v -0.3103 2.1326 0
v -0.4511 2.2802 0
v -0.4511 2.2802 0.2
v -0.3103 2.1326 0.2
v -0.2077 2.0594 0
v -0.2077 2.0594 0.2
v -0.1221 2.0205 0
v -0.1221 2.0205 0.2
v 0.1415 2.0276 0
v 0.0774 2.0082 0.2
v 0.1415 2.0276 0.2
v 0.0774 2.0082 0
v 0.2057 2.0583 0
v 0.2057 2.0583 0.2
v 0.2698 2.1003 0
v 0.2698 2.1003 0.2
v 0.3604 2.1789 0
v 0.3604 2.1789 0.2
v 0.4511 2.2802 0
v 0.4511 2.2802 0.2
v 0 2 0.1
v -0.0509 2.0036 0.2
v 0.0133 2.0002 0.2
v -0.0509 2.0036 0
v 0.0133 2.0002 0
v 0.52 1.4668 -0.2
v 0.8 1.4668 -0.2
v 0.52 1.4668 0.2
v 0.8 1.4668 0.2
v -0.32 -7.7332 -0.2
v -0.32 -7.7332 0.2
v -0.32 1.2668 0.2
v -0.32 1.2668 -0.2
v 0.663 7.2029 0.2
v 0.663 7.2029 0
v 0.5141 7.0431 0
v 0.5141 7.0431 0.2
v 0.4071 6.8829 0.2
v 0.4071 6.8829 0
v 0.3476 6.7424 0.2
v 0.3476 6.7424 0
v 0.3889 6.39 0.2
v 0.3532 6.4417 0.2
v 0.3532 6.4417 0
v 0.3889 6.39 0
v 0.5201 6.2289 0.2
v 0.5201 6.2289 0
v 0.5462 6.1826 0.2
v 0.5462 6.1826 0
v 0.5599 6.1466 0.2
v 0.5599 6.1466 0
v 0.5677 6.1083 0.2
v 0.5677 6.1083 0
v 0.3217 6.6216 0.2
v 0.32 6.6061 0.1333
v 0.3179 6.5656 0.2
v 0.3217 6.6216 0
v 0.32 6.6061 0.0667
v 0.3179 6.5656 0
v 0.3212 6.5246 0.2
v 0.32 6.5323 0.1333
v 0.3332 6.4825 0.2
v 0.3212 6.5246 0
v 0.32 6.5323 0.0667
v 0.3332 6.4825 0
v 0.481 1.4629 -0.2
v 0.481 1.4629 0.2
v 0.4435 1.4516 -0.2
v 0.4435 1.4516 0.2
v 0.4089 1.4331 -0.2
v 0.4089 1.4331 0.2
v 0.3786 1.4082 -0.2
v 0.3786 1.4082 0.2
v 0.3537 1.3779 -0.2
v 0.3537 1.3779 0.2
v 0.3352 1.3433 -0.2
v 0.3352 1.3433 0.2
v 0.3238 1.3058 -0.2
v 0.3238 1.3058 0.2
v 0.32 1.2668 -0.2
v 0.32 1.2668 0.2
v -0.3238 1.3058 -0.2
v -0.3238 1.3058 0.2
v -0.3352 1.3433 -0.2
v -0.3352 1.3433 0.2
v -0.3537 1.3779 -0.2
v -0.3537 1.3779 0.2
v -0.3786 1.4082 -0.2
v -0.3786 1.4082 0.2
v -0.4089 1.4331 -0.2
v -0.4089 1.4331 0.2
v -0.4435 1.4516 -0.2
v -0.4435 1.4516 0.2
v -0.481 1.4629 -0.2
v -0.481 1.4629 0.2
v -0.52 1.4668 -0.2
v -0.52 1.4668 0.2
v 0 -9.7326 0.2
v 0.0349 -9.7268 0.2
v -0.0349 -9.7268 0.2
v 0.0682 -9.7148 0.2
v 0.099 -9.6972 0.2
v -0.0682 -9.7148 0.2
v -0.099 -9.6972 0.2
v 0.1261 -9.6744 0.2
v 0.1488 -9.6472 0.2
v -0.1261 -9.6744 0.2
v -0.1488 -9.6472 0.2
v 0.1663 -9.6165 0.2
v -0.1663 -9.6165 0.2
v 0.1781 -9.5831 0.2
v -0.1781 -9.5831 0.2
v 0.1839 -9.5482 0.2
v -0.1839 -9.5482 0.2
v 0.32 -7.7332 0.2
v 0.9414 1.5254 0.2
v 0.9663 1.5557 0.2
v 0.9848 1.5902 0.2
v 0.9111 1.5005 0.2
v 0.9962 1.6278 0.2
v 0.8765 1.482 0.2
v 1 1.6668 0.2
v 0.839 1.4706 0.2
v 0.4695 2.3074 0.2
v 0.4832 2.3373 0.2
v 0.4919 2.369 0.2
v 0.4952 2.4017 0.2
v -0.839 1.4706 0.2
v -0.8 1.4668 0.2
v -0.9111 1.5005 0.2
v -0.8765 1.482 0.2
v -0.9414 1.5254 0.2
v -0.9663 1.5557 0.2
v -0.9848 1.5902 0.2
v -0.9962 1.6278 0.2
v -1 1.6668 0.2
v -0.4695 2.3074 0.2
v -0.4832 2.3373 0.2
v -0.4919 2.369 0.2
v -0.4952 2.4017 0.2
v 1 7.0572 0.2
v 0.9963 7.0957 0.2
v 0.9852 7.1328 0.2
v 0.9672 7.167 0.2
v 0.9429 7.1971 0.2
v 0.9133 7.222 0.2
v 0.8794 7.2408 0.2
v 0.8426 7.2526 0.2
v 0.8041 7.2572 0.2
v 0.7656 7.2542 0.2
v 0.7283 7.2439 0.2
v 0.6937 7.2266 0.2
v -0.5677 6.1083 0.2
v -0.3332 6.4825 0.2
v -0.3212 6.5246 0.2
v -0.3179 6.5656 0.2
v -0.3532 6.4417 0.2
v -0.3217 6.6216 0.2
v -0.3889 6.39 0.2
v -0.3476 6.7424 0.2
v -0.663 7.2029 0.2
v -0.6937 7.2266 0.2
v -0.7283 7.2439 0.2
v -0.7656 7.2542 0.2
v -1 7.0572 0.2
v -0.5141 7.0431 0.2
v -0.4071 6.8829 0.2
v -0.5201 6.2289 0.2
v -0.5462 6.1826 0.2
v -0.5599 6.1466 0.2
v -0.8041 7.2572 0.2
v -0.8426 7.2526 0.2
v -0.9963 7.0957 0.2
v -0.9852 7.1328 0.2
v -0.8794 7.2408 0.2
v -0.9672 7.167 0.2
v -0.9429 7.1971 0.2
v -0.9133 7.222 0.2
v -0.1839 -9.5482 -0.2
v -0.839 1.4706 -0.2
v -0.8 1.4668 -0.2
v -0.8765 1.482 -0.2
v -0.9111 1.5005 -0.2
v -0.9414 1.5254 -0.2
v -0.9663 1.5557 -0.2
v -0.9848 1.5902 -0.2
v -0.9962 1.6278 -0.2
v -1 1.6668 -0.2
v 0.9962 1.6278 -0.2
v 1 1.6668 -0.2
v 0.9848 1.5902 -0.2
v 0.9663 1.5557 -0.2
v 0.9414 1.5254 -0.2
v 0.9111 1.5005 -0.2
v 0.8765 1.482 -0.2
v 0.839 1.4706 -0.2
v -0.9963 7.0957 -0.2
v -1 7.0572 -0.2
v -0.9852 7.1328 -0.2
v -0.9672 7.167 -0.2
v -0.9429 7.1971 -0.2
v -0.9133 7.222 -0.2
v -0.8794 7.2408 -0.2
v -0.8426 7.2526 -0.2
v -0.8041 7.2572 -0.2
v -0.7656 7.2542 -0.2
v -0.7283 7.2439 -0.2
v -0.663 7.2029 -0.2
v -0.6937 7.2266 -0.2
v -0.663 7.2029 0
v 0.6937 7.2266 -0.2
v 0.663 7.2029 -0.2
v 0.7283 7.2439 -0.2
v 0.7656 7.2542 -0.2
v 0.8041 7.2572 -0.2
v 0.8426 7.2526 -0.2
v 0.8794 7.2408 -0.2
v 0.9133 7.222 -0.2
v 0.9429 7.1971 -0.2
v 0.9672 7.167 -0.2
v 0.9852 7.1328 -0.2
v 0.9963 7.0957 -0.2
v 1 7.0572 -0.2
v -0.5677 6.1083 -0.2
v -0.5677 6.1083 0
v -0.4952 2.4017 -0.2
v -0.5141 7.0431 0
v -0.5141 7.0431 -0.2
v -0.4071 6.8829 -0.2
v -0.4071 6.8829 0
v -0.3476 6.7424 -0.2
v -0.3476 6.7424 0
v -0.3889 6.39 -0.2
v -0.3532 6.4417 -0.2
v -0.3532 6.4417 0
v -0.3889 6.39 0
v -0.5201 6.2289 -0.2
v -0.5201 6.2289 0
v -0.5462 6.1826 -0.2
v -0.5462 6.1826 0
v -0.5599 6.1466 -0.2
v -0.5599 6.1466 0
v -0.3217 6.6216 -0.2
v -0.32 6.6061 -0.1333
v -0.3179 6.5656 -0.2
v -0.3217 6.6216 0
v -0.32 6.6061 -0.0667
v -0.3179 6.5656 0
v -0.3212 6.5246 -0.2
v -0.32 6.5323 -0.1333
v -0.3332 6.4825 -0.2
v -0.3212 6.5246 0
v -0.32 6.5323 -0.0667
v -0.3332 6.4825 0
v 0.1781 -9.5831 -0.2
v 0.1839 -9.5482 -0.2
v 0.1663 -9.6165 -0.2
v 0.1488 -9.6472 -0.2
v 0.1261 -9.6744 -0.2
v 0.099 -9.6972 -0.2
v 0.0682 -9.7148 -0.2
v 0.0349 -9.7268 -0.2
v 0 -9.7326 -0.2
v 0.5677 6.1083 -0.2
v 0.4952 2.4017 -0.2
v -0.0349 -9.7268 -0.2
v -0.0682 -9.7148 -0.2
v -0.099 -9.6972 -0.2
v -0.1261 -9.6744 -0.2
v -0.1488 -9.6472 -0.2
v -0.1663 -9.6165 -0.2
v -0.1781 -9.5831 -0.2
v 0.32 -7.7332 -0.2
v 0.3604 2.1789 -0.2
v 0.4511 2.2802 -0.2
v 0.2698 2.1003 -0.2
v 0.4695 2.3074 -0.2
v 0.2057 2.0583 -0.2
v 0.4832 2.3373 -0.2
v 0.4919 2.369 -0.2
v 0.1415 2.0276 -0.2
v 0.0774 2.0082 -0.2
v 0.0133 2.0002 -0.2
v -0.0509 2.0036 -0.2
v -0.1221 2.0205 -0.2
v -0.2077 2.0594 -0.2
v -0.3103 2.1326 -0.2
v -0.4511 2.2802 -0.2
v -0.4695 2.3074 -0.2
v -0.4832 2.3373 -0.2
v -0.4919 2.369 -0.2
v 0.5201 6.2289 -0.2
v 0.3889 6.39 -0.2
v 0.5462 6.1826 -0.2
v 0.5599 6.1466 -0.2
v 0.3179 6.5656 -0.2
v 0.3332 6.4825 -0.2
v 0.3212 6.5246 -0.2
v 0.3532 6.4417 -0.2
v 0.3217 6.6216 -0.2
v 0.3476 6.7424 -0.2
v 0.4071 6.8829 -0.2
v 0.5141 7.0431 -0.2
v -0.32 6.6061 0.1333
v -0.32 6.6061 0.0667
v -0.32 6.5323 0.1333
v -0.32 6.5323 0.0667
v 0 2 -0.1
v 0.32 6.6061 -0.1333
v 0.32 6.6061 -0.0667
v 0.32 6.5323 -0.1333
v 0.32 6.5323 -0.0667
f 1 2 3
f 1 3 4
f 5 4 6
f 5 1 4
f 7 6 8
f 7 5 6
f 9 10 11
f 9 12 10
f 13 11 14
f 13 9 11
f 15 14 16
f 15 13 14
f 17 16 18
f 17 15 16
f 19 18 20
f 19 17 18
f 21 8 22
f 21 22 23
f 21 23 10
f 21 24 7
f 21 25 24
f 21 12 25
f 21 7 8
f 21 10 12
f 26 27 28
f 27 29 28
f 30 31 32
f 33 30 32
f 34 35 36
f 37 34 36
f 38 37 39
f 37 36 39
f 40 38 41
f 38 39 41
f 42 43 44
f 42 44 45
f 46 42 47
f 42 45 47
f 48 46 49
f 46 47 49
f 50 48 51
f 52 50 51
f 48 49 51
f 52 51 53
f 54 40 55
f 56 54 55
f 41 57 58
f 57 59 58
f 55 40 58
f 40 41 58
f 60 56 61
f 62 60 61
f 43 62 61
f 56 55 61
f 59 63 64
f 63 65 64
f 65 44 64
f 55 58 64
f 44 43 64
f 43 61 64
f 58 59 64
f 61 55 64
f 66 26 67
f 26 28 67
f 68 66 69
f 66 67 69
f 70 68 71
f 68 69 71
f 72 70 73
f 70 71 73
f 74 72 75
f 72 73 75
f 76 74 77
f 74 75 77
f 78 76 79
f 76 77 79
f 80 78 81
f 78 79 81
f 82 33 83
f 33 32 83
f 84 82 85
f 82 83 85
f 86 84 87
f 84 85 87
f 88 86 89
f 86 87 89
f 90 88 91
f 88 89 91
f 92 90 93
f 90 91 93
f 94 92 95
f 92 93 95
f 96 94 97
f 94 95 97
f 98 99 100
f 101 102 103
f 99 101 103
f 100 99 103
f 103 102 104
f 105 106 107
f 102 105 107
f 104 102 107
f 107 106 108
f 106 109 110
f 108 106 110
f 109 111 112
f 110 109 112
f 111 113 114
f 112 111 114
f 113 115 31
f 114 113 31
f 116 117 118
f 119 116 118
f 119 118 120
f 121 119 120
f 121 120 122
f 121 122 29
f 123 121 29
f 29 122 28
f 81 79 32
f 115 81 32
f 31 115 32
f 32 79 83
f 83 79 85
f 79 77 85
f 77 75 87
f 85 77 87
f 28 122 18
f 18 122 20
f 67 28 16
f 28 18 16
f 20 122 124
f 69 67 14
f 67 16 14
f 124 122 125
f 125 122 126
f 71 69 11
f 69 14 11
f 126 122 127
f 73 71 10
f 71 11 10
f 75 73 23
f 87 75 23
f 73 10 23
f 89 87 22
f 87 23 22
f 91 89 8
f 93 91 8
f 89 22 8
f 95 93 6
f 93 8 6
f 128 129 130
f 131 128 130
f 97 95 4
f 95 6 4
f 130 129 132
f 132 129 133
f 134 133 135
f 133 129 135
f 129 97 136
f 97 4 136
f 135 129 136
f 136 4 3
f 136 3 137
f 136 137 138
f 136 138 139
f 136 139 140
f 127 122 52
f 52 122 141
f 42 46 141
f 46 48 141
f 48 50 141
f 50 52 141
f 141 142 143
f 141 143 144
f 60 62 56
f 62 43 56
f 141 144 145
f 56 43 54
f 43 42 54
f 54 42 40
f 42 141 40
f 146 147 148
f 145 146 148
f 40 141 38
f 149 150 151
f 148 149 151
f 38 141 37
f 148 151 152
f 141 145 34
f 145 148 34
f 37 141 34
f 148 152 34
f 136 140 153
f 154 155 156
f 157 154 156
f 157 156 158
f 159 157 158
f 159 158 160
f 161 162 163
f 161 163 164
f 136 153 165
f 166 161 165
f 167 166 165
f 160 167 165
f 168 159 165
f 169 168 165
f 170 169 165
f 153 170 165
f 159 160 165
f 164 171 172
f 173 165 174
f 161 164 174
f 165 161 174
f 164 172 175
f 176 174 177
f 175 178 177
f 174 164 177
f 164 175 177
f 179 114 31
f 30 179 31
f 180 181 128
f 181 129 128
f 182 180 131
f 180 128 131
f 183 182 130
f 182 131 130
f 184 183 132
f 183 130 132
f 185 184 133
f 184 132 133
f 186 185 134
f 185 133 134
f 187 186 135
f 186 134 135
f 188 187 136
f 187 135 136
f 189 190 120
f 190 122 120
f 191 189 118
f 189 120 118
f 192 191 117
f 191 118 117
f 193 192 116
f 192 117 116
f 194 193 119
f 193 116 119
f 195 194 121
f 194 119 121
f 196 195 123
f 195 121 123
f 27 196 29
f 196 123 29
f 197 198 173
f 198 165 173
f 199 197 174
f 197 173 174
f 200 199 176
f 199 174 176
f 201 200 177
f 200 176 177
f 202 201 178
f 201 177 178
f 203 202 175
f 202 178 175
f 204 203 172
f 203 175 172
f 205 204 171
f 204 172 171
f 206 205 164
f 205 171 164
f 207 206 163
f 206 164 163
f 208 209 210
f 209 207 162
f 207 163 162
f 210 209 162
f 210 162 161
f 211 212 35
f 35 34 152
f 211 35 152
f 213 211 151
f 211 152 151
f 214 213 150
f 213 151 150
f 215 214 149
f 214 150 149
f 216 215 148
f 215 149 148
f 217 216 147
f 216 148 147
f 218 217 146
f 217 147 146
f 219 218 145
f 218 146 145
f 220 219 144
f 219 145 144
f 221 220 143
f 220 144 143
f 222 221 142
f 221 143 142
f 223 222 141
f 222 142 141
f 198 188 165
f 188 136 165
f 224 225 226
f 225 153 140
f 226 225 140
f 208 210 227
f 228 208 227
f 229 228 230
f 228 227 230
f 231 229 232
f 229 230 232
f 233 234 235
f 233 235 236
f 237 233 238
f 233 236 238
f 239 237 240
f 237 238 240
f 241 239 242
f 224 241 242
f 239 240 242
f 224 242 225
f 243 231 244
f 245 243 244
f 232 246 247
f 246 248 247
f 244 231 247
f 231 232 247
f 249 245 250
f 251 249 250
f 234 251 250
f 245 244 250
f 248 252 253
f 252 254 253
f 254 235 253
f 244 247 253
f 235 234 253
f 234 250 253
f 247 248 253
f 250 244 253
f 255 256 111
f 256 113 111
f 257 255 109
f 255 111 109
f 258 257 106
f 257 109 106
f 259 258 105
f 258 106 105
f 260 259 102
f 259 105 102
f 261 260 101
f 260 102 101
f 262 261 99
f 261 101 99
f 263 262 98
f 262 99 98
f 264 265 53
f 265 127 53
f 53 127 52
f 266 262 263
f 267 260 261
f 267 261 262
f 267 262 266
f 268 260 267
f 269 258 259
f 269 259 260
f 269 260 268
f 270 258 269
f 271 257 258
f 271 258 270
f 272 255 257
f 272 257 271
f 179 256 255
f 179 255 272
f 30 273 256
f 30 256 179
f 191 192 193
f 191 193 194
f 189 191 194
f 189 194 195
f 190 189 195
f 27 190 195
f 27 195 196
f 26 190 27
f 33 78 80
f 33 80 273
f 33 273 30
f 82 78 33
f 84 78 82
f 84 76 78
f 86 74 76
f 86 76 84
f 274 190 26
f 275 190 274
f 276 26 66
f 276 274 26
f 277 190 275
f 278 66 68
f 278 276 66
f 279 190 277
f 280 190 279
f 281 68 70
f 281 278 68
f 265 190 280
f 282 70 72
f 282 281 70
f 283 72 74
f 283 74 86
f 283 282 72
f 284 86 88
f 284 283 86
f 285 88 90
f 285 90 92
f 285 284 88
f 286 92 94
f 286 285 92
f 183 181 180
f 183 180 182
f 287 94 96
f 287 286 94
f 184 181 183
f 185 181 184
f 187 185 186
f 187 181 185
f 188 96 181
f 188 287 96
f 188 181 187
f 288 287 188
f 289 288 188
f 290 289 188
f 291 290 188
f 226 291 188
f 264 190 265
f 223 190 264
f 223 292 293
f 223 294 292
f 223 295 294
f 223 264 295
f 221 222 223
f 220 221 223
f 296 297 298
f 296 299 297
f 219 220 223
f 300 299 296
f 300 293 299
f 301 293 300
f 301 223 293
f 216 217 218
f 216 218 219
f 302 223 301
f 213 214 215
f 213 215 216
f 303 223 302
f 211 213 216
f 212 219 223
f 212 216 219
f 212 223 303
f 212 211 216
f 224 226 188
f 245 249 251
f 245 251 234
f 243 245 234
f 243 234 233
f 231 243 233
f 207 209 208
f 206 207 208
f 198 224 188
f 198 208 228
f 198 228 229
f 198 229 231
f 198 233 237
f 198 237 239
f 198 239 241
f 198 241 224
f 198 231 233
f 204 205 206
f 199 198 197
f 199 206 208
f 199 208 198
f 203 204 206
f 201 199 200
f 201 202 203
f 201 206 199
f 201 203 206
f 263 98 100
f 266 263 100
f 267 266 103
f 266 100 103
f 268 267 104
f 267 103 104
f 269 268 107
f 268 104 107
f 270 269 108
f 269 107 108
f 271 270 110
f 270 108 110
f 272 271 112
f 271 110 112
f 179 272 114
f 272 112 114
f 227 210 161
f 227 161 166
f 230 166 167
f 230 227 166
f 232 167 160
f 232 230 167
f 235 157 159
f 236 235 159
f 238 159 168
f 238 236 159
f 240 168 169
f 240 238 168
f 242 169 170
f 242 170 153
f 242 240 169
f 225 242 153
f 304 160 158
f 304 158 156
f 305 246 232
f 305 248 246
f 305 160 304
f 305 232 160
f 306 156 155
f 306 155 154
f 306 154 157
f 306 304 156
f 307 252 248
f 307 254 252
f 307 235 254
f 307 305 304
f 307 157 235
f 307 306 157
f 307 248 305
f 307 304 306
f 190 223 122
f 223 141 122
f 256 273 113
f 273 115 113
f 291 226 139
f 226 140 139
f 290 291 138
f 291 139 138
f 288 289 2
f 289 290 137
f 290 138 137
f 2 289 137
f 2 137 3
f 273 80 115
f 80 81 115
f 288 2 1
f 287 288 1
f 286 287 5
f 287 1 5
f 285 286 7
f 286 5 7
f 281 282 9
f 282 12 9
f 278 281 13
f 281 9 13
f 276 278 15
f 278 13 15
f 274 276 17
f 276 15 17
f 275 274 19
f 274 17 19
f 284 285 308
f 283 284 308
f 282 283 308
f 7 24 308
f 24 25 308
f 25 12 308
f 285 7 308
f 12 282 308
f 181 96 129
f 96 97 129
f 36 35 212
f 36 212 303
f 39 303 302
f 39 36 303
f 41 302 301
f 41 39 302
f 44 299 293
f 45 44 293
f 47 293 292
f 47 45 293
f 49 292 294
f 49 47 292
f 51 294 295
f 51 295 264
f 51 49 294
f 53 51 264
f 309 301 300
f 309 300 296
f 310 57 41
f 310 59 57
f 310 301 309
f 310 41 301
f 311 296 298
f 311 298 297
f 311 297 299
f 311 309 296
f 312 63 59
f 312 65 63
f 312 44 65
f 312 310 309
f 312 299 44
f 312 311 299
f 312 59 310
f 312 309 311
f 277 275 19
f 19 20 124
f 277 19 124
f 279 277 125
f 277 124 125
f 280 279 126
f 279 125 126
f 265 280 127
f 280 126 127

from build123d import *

# Parameters (mm, degrees)
BOSS_EXTRUDE1_DEPTH = 0.2


with BuildPart() as part:
    # Sketch1 → Boss-Extrude1 (new body, symmetric)
    with BuildSketch(Plane.XY):
        with BuildLine():
            Line((-0.32, -7.733224852), (-0.32, 1.266775148))
            ThreePointArc((-0.32, 1.266775148), (-0.378578644, 1.408196504), (-0.52, 1.466775148))
            Line((-0.52, 1.466775148), (-0.8, 1.466775148))
            ThreePointArc((-0.8, 1.466775148), (-0.941421356, 1.525353792), (-1, 1.666775148))
            Line((-1, 1.666775148), (-1, 7.057198685))
            ThreePointArc((-1, 7.057198685), (-0.87939743, 7.240763518), (-0.663039519, 7.202944445))
            add(Edge.make_bspline(
                [(-0.663039519, 7.202944445), (-0.487599251, 7.038079386), (-0.326177604, 6.816155039), (-0.310671132, 6.388247389), (-0.548453888, 6.275984696), (-0.567669208, 6.108344969)],
                knots=[0.253308427, 0.253308427, 0.253308427, 0.253308427, 0.663171976, 0.707067436, 1, 1, 1, 1], degree=3))
            Line((-0.567669208, 6.108344969), (-0.495215905, 2.401684718))
            ThreePointArc((-0.495215905, 2.401684718), (-0.483221967, 2.337269967), (-0.451053839, 2.280188217))
            add(Edge.make_bspline(
                [(-0.451053839, 2.280188217), (0, 1.719811783), (0.451053839, 2.280188217)],
                knots=[0.043404734, 0.043404734, 0.043404734, 0.956595266, 0.956595266, 0.956595266], degree=2))
            ThreePointArc((0.451053839, 2.280188217), (0.483221967, 2.337269967), (0.495215905, 2.401684718))
            Line((0.495215905, 2.401684718), (0.567669208, 6.108344969))
            add(Edge.make_bspline(
                [(0.663039519, 7.202944445), (0.487599251, 7.038079386), (0.326177604, 6.816155039), (0.310671132, 6.388247389), (0.548453888, 6.275984696), (0.567669208, 6.108344969)],
                knots=[0.253308427, 0.253308427, 0.253308427, 0.253308427, 0.663171976, 0.707067436, 1, 1, 1, 1], degree=3))
            ThreePointArc((0.663039519, 7.202944445), (0.87939743, 7.240763518), (1, 7.057198685))
            Line((1, 7.057198685), (1, 1.666775148))
            ThreePointArc((1, 1.666775148), (0.941421356, 1.525353792), (0.8, 1.466775148))
            Line((0.8, 1.466775148), (0.52, 1.466775148))
            ThreePointArc((0.52, 1.466775148), (0.378578644, 1.408196504), (0.32, 1.266775148))
            Line((0.32, 1.266775148), (0.32, -7.733224852))
            Line((0.32, -7.733224852), (0.183878151, -9.548182842))
            ThreePointArc((0.183878151, -9.548182842), (0.126073555, -9.674431974), (0, -9.732618516))
            ThreePointArc((0, -9.732618516), (-0.126073555, -9.674431974), (-0.183878151, -9.548182842))
            Line((-0.183878151, -9.548182842), (-0.32, -7.733224852))
        make_face()
    extrude(amount=BOSS_EXTRUDE1_DEPTH, both=True)


solid = part.part
